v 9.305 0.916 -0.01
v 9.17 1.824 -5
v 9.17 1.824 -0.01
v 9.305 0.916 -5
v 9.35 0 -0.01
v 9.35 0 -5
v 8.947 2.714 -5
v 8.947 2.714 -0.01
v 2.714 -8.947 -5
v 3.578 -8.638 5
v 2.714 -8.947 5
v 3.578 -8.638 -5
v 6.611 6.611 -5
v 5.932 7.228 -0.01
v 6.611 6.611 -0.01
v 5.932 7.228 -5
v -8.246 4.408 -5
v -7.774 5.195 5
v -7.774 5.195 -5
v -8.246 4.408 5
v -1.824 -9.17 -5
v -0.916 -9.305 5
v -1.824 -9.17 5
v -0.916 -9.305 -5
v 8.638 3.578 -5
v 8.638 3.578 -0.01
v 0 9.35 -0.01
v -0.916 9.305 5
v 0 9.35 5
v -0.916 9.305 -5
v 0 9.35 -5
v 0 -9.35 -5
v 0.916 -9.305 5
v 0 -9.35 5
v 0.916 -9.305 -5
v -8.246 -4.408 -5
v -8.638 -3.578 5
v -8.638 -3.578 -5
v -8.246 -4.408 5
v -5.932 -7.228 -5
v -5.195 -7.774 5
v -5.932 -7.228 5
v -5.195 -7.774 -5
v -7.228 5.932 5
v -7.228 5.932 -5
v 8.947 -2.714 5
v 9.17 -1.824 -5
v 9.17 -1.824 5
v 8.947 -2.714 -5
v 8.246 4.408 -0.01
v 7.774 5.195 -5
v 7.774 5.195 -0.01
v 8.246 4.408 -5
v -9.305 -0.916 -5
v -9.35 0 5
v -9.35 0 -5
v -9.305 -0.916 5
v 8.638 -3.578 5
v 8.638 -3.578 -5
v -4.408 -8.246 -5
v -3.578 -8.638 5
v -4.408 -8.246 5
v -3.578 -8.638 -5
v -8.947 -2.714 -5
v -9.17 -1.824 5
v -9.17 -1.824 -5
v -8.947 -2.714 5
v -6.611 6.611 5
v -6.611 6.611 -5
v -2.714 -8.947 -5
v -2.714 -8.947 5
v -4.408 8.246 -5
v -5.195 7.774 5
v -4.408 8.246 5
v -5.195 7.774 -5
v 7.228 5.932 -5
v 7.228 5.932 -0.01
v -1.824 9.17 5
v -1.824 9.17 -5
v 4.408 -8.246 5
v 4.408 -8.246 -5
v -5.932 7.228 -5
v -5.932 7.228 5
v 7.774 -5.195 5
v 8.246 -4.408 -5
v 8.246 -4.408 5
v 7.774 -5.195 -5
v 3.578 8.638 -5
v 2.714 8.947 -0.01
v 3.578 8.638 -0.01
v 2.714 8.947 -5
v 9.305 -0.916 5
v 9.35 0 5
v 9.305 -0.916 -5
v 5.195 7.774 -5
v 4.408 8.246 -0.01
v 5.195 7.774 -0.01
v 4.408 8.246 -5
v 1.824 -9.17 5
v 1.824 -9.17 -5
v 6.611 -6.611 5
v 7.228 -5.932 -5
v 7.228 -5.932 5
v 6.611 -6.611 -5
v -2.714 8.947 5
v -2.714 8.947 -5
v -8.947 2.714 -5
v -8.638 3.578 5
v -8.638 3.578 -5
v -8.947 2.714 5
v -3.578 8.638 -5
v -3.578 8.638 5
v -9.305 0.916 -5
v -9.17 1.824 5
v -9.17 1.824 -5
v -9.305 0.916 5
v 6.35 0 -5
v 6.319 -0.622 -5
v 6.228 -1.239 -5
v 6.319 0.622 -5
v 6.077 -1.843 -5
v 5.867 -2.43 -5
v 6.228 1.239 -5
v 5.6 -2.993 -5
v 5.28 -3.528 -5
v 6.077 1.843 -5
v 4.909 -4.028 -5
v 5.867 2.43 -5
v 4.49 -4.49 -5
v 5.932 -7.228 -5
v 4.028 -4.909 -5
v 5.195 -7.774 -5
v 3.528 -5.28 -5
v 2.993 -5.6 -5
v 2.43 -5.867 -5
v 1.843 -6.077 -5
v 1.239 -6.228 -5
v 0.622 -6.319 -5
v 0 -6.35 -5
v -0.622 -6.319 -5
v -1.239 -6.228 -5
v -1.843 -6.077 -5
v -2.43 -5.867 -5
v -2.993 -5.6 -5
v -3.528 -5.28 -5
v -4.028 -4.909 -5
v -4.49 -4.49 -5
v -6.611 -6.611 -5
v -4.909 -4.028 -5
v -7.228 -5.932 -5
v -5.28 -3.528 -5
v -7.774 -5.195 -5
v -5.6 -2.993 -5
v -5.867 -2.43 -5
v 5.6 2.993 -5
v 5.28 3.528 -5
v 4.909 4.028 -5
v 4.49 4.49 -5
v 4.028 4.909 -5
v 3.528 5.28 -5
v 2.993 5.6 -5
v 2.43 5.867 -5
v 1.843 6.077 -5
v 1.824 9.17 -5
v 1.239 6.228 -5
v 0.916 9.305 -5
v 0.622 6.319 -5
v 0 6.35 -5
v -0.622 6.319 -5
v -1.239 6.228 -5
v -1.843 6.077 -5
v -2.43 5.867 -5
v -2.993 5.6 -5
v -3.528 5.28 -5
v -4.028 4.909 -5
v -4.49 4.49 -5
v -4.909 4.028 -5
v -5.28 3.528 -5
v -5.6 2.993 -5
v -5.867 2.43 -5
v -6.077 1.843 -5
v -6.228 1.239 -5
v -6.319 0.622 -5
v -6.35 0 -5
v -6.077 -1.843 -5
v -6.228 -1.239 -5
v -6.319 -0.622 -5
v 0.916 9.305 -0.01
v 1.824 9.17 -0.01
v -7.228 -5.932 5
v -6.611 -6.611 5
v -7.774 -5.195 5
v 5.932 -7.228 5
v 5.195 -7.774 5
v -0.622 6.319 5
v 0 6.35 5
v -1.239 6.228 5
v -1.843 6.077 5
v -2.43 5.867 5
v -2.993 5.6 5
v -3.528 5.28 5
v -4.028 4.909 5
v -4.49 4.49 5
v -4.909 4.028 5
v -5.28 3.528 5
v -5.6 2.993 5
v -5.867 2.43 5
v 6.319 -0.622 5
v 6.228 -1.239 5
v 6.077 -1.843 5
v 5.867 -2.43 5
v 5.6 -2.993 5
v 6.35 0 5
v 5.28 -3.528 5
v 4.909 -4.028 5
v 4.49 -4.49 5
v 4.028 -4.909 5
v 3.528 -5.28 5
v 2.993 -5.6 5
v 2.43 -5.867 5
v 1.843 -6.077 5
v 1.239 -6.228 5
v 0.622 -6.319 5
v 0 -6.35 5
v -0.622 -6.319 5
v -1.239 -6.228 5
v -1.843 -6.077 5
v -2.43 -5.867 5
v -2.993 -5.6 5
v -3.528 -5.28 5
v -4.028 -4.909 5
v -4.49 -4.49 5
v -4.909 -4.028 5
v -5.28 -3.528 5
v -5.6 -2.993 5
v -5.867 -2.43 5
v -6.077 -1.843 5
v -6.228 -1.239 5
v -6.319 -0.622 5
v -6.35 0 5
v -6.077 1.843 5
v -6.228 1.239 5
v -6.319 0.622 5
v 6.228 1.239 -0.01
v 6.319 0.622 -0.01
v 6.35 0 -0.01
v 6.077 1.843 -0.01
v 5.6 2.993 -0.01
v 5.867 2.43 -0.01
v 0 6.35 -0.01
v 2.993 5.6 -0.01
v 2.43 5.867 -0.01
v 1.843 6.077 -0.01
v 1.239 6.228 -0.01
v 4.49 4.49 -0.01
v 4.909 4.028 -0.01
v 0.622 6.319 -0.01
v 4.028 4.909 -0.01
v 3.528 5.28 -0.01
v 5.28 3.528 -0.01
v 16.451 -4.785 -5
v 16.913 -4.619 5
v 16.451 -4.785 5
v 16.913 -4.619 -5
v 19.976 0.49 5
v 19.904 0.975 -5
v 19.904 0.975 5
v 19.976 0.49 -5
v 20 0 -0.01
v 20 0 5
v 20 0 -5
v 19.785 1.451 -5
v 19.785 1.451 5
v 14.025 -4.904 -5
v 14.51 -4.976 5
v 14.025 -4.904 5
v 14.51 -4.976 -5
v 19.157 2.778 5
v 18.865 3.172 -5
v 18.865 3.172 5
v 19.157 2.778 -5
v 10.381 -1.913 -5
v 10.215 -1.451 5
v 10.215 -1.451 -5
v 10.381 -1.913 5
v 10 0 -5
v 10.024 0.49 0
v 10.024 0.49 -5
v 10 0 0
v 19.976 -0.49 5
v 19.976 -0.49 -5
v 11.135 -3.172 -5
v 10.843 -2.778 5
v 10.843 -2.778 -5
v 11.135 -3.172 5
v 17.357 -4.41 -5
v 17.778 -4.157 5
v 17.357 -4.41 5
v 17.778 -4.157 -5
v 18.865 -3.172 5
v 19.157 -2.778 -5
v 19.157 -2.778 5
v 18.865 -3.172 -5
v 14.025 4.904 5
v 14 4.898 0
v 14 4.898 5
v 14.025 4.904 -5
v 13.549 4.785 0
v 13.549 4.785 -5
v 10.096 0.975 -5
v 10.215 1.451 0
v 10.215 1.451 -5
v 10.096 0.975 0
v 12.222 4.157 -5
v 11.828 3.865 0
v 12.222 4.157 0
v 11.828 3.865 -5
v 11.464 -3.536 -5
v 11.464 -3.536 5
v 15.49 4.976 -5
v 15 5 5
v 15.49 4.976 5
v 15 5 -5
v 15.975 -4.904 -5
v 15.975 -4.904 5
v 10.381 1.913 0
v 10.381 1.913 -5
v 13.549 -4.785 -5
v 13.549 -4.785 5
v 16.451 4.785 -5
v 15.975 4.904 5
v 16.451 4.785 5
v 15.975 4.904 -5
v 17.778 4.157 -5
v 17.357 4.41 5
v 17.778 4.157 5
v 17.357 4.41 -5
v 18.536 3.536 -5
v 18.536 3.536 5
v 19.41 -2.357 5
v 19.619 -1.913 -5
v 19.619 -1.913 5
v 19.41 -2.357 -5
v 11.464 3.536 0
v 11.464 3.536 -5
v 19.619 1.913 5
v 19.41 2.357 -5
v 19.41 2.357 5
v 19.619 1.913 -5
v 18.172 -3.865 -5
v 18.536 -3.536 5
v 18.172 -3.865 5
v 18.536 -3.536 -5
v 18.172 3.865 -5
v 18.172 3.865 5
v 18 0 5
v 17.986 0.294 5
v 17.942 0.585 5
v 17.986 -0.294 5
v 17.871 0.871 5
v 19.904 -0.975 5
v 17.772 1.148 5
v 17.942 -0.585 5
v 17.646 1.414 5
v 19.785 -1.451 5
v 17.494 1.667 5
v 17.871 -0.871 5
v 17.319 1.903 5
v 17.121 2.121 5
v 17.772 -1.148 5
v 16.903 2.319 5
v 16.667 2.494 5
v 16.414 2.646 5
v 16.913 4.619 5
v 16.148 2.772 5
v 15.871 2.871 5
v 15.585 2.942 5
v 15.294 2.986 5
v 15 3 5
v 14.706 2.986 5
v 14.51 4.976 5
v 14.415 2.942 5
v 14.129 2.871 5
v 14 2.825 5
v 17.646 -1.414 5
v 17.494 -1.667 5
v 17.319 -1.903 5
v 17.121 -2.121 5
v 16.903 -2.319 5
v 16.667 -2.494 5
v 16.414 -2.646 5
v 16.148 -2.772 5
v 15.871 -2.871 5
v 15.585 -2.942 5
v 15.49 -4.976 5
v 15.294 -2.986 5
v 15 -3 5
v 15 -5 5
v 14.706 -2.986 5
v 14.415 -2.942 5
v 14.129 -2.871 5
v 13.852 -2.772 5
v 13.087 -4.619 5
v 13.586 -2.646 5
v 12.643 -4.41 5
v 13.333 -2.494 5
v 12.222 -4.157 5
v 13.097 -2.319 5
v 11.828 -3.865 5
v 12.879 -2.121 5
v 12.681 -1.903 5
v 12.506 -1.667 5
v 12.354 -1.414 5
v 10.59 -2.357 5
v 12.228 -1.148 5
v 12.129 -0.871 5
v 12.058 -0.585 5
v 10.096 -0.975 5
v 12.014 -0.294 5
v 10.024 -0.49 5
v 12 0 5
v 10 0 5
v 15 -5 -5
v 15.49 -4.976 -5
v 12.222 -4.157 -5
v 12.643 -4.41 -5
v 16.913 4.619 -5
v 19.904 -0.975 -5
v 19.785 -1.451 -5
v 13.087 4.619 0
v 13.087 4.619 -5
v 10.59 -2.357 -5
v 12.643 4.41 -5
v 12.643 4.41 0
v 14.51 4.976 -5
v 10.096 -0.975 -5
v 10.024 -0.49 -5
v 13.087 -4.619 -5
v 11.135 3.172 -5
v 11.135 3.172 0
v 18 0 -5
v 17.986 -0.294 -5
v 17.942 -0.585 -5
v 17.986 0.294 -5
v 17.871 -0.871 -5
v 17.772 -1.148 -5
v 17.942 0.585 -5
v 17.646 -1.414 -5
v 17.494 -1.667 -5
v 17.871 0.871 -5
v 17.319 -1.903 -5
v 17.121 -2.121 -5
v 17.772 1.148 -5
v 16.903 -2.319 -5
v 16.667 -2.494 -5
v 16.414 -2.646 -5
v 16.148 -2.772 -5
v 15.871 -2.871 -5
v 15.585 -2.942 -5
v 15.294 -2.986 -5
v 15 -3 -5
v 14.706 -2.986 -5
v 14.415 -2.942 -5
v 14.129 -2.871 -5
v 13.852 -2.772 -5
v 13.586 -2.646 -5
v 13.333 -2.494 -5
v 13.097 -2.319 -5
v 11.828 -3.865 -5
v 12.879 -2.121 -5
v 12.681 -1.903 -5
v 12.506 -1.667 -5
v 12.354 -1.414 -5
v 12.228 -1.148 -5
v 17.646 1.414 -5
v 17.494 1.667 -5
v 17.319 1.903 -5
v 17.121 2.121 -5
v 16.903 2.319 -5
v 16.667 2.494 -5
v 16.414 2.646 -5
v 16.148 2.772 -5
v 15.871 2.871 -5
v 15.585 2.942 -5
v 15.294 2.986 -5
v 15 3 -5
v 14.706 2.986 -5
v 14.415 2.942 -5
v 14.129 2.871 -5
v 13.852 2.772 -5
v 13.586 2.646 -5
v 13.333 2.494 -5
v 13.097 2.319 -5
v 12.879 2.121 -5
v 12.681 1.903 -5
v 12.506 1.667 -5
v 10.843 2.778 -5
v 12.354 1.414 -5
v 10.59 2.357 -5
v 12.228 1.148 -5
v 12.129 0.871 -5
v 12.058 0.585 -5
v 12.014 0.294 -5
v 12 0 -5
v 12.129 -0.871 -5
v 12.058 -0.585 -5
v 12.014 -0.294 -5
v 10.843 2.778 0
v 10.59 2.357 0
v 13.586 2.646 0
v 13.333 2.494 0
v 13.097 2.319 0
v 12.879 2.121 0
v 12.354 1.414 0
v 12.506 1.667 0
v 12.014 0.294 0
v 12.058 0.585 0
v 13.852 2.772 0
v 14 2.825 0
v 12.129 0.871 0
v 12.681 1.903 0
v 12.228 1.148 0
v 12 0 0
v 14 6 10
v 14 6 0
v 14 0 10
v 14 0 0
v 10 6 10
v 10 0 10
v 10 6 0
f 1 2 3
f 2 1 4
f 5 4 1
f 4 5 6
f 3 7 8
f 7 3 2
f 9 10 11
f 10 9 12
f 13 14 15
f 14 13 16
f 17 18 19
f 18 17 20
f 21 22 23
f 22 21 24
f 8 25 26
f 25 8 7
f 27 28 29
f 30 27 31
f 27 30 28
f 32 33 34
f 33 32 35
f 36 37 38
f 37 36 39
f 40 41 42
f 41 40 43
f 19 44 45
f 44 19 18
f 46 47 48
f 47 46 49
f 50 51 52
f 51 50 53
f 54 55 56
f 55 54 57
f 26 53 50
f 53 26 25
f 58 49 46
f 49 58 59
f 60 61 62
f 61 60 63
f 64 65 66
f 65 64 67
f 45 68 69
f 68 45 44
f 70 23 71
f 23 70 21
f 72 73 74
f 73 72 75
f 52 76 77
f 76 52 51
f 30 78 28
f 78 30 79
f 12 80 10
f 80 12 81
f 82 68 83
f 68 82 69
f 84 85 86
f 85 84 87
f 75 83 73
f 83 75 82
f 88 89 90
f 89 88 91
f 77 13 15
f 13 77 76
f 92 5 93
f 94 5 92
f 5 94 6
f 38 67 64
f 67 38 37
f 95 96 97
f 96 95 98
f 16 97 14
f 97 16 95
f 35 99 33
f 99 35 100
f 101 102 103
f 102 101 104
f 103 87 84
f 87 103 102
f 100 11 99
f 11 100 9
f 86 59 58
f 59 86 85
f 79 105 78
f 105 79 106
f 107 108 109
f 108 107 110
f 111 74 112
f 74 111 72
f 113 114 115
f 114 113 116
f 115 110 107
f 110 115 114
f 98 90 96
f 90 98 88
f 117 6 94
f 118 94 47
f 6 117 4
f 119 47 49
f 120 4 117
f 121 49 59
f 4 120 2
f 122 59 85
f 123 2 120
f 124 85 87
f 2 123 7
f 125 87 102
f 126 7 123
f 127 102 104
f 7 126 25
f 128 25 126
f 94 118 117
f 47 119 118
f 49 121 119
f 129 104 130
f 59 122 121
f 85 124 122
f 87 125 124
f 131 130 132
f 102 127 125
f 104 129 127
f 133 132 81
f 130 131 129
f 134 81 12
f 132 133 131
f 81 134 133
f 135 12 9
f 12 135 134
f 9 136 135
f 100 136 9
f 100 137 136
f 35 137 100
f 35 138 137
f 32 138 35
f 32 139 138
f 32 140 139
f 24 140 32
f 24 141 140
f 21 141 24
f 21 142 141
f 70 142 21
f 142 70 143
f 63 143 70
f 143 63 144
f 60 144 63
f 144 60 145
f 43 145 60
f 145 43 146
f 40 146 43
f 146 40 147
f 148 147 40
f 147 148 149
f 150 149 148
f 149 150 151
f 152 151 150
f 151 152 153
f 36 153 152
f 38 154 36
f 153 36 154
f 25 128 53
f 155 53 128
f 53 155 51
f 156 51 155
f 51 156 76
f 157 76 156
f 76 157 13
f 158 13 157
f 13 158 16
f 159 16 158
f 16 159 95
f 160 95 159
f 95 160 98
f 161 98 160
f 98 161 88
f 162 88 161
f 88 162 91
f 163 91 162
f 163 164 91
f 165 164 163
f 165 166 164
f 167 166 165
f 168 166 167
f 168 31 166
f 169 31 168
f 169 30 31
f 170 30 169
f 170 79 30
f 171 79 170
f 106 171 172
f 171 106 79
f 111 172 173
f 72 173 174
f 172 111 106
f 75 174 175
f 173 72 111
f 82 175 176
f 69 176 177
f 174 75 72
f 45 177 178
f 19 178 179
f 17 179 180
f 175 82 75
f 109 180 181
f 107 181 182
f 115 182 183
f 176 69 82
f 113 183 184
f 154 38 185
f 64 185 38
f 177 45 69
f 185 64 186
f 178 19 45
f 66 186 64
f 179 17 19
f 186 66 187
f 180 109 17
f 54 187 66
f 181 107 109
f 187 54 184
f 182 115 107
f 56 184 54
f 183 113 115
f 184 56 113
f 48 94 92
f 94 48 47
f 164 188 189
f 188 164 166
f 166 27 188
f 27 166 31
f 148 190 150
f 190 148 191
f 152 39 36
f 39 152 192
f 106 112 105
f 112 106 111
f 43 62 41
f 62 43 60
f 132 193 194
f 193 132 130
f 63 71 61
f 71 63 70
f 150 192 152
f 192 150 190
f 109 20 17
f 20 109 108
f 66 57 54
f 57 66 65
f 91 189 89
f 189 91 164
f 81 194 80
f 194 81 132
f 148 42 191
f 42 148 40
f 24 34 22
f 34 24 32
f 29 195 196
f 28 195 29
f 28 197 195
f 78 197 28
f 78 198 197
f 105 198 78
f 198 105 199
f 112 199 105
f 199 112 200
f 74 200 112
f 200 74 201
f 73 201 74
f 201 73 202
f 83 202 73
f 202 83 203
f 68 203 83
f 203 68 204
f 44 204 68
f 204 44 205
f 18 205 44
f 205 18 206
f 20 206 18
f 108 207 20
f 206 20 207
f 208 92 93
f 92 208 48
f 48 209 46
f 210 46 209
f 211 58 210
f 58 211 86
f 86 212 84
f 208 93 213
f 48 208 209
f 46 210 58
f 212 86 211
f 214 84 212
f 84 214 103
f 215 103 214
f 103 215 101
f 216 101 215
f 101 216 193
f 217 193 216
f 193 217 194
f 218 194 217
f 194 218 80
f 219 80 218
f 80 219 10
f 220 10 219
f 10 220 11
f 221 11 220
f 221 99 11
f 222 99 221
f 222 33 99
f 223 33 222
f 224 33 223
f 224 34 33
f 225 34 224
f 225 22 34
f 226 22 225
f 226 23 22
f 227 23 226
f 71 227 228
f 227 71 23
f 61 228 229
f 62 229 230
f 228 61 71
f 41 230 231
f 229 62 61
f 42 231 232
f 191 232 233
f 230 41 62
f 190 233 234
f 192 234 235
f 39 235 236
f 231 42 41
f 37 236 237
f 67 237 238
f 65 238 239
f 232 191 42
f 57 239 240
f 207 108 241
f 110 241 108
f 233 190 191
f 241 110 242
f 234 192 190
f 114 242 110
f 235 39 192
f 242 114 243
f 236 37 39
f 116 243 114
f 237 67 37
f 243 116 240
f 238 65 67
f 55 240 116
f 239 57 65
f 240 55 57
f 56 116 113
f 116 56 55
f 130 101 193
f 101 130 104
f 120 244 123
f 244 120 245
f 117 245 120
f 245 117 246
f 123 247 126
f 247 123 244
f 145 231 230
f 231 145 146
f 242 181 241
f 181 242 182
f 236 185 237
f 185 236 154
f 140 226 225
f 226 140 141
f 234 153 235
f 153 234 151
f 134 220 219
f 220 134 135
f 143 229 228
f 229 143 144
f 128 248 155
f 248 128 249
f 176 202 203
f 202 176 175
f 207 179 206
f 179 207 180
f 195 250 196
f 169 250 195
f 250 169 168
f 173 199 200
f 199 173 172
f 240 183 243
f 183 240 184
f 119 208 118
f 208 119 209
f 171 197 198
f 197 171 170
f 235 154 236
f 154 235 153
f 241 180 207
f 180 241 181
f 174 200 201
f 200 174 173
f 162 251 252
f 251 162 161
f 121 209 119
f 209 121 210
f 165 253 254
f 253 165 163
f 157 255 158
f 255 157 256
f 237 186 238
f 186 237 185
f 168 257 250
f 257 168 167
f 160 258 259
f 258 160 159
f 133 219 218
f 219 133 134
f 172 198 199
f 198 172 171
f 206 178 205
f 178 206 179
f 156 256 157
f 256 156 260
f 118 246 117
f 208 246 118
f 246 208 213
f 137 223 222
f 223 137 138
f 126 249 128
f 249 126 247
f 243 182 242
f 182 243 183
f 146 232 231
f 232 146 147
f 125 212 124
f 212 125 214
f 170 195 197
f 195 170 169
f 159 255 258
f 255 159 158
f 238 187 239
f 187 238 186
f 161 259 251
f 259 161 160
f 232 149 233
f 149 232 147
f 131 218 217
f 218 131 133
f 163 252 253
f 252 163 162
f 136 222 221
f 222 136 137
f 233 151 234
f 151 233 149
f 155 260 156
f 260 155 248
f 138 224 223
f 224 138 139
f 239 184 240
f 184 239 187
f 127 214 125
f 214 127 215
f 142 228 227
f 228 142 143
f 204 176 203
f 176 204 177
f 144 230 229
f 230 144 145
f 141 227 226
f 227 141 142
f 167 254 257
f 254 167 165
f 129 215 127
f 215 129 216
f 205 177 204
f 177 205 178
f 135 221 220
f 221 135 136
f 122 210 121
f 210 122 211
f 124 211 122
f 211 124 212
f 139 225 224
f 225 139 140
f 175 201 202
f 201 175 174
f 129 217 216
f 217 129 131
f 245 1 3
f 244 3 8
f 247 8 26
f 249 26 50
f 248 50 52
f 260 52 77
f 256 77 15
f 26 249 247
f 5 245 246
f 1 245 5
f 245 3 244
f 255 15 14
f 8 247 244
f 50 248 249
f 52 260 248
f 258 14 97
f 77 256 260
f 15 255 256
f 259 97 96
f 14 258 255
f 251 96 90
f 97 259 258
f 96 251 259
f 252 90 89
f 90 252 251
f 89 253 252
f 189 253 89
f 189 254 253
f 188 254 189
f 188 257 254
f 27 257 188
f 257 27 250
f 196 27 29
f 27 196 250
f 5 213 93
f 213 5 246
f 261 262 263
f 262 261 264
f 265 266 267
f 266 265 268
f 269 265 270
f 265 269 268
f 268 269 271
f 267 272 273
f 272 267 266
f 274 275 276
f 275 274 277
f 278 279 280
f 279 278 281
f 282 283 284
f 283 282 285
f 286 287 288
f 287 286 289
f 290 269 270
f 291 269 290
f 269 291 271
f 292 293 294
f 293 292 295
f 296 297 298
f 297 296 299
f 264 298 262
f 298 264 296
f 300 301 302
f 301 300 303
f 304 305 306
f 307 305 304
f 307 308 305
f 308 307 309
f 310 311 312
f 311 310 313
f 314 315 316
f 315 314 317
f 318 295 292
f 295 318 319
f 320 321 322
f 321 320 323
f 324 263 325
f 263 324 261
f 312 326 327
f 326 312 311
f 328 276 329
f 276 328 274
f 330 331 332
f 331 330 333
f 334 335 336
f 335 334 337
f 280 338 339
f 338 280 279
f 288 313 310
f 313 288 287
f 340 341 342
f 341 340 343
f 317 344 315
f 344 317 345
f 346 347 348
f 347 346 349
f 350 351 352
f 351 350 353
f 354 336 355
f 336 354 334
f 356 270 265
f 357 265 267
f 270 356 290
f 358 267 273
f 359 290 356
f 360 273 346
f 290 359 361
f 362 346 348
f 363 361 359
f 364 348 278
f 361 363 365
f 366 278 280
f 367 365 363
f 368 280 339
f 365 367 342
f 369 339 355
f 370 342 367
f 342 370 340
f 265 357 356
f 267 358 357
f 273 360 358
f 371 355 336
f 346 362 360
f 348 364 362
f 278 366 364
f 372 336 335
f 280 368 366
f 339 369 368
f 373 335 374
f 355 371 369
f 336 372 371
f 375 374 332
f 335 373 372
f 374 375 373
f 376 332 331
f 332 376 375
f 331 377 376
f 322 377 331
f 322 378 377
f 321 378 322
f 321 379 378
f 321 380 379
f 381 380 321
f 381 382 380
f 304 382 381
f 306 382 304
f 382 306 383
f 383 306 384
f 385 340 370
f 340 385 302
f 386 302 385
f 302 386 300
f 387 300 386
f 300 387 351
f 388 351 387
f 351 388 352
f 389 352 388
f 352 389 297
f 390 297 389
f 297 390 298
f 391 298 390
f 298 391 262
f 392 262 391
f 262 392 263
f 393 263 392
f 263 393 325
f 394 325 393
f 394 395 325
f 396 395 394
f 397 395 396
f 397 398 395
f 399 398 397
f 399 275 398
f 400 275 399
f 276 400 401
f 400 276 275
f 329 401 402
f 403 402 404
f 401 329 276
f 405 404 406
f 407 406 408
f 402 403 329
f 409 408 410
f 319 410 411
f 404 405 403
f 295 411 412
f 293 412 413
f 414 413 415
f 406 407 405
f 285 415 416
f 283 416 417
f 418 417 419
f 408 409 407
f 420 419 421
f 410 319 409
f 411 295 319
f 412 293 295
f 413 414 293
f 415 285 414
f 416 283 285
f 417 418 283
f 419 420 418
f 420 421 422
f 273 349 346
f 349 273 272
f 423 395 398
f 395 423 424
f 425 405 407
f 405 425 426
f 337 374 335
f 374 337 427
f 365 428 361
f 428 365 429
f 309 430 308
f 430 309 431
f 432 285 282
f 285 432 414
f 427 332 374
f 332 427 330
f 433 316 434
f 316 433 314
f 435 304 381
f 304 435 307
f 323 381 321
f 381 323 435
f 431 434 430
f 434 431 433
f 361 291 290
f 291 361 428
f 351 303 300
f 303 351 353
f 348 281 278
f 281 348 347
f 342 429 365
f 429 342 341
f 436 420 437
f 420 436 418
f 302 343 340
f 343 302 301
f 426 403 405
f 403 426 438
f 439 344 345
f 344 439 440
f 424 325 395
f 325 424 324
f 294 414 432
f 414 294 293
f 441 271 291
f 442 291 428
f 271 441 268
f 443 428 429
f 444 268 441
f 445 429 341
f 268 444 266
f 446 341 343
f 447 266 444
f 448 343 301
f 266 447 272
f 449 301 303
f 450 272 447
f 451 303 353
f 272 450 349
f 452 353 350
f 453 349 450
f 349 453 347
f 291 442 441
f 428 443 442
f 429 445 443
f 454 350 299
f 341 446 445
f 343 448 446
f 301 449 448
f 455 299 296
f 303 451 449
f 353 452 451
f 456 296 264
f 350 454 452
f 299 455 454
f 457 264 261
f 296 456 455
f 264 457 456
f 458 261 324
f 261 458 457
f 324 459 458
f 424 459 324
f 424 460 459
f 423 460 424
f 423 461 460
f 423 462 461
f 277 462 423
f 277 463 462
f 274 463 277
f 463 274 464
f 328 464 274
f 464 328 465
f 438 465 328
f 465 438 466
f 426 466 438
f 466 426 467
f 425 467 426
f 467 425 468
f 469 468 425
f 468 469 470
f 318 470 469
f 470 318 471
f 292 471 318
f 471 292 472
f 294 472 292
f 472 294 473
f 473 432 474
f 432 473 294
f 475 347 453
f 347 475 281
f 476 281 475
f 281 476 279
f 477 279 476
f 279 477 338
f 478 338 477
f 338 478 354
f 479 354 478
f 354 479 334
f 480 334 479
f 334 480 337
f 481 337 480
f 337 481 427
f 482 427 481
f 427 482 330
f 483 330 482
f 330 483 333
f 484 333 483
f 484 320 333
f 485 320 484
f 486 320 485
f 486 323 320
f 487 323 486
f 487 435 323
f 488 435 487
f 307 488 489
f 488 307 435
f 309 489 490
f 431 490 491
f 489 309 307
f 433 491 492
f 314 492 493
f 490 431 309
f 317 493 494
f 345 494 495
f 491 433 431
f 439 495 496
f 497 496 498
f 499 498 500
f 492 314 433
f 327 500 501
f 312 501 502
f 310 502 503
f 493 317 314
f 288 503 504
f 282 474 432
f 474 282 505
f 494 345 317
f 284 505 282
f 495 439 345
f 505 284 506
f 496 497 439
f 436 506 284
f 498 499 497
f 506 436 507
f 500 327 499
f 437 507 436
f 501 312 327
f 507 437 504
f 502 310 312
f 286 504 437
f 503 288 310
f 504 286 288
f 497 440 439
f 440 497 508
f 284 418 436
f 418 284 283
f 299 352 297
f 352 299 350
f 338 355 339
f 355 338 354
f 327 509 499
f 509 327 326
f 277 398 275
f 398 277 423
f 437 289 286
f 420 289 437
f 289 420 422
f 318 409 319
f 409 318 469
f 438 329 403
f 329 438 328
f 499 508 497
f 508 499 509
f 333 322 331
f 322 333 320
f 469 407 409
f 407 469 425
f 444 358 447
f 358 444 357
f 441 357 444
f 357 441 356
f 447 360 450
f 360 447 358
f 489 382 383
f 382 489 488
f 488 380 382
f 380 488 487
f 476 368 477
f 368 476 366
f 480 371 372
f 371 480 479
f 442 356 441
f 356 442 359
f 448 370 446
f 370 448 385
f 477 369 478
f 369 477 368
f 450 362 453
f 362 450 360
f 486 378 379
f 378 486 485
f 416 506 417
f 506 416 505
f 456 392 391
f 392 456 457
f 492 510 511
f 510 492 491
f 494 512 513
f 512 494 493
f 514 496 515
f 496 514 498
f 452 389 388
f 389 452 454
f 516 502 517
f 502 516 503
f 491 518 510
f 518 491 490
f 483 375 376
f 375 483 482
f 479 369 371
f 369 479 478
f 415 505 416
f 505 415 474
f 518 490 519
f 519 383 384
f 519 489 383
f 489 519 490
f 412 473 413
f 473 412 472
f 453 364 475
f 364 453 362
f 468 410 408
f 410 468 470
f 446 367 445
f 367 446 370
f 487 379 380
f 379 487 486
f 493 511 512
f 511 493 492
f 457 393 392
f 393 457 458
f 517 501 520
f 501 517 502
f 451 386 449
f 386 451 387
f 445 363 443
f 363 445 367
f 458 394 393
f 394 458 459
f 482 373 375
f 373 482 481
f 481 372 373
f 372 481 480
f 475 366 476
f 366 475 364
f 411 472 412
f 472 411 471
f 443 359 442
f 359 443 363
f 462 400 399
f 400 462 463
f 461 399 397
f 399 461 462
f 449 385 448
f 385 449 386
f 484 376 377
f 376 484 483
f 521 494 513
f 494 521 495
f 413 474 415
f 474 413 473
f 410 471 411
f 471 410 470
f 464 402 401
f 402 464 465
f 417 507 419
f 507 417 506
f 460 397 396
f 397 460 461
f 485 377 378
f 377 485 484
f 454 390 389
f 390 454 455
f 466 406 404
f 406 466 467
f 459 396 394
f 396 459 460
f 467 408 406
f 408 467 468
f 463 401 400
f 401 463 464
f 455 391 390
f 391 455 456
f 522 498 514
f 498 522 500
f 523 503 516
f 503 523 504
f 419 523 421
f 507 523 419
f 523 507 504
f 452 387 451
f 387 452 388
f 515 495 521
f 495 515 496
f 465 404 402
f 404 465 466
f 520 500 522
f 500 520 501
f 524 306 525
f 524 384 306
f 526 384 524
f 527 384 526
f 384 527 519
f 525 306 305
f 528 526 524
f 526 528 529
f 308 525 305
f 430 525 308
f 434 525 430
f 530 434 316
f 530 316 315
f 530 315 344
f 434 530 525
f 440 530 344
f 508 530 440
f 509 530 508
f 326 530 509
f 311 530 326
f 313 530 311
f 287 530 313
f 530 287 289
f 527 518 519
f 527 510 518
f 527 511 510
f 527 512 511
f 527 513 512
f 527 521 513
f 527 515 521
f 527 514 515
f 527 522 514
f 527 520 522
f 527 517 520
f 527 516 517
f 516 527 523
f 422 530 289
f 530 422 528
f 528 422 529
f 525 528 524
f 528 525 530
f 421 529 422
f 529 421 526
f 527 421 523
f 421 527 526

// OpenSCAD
$fn = 64;

// Dimensions
rod_diameter = 12.7;           // Inner diameter of rod ring
rod_wall = 3;                 // Wall thickness of rod ring
rod_outer_diameter = rod_diameter + 2 * rod_wall; // 18.7 mm

tubing_inner_diameter = 6;       // Inner diameter of tubing ring
tubing_wall = 2;               // Wall thickness of tubing ring
tubing_outer_diameter = tubing_inner_diameter + 2 * tubing_wall; // 10 mm

bridge_width_y = 6;            // Width of bridge in Y direction
bridge_start_x = 8;          // Start X of bridge
bridge_end_x = 12;            // End X of bridge

// Rod ring: centered at origin, with -X side opening
rod_ring_inner_radius = rod_diameter / 2;
rod_ring_outer_radius = rod_outer_diameter / 2;

// Tubing ring: centered at (15, 0), with +X side opening
tubing_ring_center_x = 15;
tubing_ring_center_y = 0;
tubing_ring_inner_radius = tubing_inner_diameter / 2;
tubing_ring_outer_radius = tubing_outer_diameter / 2;

// Opening dimensions
rod_opening_width = 10;     // Width of opening in rod ring (x < 0, -5 < y < 5)
tubing_opening_width = 4.5;    // Width of opening in tubing ring (x > 15, -2.25 < y < 2.25)

// Bridge: solid connection between rings
bridge_y_min = -bridge_width_y / 2;
bridge_y_max = bridge_width_y / 2;

// Build the clip
module clip() {
    // Start with rod ring
    difference() {
        // Outer ring (rod ring)
        cylinder(r = rod_ring_outer_radius, h = 10, center = true);
        
        // Inner hole (rod ring)
        cylinder(r = rod_ring_inner_radius, h = 10.01, center = true);
        
        // Cut out rod ring opening: rectangle from x = -inf to x = 0, y = -5 to 5
        // Extend slightly beyond to ensure clean cut
        translate([0, 0, -0.01])
            cube([rod_ring_outer_radius * 2, rod_opening_width, 10.02], center = false);
    }

    // Add tubing ring (with its own opening)
    difference() {
        // Outer tubing ring
        translate([tubing_ring_center_x, tubing_ring_center_y, 0])
            cylinder(r = tubing_ring_outer_radius, h = 10, center = true);
        
        // Inner hole of tubing ring
        translate([tubing_ring_center_x, tubing_ring_center_y, 0])
            cylinder(r = tubing_ring_inner_radius, h = 10.01, center = true);
        
        // Cut out tubing ring opening: rectangle from x = 15 to x = 15 + 4.5, y = -2.25 to 2.25
        translate([tubing_ring_center_x + tubing_ring_outer_radius, 0, -0.01])
            cube([tubing_opening_width + 0.1, tubing_opening_width, 10.02], center = false);
    }

    // Add bridge between rings
    // Bridge is a solid rectangle from x = 8 to 12, y = -3 to 3, z = 0 to 10
    translate([bridge_start_x + (bridge_end_x - bridge_start_x)/2, 0, 0])
        cube([bridge_end_x - bridge_start_x, bridge_width_y, 10], center = false);
}

// Render the clip
clip();
